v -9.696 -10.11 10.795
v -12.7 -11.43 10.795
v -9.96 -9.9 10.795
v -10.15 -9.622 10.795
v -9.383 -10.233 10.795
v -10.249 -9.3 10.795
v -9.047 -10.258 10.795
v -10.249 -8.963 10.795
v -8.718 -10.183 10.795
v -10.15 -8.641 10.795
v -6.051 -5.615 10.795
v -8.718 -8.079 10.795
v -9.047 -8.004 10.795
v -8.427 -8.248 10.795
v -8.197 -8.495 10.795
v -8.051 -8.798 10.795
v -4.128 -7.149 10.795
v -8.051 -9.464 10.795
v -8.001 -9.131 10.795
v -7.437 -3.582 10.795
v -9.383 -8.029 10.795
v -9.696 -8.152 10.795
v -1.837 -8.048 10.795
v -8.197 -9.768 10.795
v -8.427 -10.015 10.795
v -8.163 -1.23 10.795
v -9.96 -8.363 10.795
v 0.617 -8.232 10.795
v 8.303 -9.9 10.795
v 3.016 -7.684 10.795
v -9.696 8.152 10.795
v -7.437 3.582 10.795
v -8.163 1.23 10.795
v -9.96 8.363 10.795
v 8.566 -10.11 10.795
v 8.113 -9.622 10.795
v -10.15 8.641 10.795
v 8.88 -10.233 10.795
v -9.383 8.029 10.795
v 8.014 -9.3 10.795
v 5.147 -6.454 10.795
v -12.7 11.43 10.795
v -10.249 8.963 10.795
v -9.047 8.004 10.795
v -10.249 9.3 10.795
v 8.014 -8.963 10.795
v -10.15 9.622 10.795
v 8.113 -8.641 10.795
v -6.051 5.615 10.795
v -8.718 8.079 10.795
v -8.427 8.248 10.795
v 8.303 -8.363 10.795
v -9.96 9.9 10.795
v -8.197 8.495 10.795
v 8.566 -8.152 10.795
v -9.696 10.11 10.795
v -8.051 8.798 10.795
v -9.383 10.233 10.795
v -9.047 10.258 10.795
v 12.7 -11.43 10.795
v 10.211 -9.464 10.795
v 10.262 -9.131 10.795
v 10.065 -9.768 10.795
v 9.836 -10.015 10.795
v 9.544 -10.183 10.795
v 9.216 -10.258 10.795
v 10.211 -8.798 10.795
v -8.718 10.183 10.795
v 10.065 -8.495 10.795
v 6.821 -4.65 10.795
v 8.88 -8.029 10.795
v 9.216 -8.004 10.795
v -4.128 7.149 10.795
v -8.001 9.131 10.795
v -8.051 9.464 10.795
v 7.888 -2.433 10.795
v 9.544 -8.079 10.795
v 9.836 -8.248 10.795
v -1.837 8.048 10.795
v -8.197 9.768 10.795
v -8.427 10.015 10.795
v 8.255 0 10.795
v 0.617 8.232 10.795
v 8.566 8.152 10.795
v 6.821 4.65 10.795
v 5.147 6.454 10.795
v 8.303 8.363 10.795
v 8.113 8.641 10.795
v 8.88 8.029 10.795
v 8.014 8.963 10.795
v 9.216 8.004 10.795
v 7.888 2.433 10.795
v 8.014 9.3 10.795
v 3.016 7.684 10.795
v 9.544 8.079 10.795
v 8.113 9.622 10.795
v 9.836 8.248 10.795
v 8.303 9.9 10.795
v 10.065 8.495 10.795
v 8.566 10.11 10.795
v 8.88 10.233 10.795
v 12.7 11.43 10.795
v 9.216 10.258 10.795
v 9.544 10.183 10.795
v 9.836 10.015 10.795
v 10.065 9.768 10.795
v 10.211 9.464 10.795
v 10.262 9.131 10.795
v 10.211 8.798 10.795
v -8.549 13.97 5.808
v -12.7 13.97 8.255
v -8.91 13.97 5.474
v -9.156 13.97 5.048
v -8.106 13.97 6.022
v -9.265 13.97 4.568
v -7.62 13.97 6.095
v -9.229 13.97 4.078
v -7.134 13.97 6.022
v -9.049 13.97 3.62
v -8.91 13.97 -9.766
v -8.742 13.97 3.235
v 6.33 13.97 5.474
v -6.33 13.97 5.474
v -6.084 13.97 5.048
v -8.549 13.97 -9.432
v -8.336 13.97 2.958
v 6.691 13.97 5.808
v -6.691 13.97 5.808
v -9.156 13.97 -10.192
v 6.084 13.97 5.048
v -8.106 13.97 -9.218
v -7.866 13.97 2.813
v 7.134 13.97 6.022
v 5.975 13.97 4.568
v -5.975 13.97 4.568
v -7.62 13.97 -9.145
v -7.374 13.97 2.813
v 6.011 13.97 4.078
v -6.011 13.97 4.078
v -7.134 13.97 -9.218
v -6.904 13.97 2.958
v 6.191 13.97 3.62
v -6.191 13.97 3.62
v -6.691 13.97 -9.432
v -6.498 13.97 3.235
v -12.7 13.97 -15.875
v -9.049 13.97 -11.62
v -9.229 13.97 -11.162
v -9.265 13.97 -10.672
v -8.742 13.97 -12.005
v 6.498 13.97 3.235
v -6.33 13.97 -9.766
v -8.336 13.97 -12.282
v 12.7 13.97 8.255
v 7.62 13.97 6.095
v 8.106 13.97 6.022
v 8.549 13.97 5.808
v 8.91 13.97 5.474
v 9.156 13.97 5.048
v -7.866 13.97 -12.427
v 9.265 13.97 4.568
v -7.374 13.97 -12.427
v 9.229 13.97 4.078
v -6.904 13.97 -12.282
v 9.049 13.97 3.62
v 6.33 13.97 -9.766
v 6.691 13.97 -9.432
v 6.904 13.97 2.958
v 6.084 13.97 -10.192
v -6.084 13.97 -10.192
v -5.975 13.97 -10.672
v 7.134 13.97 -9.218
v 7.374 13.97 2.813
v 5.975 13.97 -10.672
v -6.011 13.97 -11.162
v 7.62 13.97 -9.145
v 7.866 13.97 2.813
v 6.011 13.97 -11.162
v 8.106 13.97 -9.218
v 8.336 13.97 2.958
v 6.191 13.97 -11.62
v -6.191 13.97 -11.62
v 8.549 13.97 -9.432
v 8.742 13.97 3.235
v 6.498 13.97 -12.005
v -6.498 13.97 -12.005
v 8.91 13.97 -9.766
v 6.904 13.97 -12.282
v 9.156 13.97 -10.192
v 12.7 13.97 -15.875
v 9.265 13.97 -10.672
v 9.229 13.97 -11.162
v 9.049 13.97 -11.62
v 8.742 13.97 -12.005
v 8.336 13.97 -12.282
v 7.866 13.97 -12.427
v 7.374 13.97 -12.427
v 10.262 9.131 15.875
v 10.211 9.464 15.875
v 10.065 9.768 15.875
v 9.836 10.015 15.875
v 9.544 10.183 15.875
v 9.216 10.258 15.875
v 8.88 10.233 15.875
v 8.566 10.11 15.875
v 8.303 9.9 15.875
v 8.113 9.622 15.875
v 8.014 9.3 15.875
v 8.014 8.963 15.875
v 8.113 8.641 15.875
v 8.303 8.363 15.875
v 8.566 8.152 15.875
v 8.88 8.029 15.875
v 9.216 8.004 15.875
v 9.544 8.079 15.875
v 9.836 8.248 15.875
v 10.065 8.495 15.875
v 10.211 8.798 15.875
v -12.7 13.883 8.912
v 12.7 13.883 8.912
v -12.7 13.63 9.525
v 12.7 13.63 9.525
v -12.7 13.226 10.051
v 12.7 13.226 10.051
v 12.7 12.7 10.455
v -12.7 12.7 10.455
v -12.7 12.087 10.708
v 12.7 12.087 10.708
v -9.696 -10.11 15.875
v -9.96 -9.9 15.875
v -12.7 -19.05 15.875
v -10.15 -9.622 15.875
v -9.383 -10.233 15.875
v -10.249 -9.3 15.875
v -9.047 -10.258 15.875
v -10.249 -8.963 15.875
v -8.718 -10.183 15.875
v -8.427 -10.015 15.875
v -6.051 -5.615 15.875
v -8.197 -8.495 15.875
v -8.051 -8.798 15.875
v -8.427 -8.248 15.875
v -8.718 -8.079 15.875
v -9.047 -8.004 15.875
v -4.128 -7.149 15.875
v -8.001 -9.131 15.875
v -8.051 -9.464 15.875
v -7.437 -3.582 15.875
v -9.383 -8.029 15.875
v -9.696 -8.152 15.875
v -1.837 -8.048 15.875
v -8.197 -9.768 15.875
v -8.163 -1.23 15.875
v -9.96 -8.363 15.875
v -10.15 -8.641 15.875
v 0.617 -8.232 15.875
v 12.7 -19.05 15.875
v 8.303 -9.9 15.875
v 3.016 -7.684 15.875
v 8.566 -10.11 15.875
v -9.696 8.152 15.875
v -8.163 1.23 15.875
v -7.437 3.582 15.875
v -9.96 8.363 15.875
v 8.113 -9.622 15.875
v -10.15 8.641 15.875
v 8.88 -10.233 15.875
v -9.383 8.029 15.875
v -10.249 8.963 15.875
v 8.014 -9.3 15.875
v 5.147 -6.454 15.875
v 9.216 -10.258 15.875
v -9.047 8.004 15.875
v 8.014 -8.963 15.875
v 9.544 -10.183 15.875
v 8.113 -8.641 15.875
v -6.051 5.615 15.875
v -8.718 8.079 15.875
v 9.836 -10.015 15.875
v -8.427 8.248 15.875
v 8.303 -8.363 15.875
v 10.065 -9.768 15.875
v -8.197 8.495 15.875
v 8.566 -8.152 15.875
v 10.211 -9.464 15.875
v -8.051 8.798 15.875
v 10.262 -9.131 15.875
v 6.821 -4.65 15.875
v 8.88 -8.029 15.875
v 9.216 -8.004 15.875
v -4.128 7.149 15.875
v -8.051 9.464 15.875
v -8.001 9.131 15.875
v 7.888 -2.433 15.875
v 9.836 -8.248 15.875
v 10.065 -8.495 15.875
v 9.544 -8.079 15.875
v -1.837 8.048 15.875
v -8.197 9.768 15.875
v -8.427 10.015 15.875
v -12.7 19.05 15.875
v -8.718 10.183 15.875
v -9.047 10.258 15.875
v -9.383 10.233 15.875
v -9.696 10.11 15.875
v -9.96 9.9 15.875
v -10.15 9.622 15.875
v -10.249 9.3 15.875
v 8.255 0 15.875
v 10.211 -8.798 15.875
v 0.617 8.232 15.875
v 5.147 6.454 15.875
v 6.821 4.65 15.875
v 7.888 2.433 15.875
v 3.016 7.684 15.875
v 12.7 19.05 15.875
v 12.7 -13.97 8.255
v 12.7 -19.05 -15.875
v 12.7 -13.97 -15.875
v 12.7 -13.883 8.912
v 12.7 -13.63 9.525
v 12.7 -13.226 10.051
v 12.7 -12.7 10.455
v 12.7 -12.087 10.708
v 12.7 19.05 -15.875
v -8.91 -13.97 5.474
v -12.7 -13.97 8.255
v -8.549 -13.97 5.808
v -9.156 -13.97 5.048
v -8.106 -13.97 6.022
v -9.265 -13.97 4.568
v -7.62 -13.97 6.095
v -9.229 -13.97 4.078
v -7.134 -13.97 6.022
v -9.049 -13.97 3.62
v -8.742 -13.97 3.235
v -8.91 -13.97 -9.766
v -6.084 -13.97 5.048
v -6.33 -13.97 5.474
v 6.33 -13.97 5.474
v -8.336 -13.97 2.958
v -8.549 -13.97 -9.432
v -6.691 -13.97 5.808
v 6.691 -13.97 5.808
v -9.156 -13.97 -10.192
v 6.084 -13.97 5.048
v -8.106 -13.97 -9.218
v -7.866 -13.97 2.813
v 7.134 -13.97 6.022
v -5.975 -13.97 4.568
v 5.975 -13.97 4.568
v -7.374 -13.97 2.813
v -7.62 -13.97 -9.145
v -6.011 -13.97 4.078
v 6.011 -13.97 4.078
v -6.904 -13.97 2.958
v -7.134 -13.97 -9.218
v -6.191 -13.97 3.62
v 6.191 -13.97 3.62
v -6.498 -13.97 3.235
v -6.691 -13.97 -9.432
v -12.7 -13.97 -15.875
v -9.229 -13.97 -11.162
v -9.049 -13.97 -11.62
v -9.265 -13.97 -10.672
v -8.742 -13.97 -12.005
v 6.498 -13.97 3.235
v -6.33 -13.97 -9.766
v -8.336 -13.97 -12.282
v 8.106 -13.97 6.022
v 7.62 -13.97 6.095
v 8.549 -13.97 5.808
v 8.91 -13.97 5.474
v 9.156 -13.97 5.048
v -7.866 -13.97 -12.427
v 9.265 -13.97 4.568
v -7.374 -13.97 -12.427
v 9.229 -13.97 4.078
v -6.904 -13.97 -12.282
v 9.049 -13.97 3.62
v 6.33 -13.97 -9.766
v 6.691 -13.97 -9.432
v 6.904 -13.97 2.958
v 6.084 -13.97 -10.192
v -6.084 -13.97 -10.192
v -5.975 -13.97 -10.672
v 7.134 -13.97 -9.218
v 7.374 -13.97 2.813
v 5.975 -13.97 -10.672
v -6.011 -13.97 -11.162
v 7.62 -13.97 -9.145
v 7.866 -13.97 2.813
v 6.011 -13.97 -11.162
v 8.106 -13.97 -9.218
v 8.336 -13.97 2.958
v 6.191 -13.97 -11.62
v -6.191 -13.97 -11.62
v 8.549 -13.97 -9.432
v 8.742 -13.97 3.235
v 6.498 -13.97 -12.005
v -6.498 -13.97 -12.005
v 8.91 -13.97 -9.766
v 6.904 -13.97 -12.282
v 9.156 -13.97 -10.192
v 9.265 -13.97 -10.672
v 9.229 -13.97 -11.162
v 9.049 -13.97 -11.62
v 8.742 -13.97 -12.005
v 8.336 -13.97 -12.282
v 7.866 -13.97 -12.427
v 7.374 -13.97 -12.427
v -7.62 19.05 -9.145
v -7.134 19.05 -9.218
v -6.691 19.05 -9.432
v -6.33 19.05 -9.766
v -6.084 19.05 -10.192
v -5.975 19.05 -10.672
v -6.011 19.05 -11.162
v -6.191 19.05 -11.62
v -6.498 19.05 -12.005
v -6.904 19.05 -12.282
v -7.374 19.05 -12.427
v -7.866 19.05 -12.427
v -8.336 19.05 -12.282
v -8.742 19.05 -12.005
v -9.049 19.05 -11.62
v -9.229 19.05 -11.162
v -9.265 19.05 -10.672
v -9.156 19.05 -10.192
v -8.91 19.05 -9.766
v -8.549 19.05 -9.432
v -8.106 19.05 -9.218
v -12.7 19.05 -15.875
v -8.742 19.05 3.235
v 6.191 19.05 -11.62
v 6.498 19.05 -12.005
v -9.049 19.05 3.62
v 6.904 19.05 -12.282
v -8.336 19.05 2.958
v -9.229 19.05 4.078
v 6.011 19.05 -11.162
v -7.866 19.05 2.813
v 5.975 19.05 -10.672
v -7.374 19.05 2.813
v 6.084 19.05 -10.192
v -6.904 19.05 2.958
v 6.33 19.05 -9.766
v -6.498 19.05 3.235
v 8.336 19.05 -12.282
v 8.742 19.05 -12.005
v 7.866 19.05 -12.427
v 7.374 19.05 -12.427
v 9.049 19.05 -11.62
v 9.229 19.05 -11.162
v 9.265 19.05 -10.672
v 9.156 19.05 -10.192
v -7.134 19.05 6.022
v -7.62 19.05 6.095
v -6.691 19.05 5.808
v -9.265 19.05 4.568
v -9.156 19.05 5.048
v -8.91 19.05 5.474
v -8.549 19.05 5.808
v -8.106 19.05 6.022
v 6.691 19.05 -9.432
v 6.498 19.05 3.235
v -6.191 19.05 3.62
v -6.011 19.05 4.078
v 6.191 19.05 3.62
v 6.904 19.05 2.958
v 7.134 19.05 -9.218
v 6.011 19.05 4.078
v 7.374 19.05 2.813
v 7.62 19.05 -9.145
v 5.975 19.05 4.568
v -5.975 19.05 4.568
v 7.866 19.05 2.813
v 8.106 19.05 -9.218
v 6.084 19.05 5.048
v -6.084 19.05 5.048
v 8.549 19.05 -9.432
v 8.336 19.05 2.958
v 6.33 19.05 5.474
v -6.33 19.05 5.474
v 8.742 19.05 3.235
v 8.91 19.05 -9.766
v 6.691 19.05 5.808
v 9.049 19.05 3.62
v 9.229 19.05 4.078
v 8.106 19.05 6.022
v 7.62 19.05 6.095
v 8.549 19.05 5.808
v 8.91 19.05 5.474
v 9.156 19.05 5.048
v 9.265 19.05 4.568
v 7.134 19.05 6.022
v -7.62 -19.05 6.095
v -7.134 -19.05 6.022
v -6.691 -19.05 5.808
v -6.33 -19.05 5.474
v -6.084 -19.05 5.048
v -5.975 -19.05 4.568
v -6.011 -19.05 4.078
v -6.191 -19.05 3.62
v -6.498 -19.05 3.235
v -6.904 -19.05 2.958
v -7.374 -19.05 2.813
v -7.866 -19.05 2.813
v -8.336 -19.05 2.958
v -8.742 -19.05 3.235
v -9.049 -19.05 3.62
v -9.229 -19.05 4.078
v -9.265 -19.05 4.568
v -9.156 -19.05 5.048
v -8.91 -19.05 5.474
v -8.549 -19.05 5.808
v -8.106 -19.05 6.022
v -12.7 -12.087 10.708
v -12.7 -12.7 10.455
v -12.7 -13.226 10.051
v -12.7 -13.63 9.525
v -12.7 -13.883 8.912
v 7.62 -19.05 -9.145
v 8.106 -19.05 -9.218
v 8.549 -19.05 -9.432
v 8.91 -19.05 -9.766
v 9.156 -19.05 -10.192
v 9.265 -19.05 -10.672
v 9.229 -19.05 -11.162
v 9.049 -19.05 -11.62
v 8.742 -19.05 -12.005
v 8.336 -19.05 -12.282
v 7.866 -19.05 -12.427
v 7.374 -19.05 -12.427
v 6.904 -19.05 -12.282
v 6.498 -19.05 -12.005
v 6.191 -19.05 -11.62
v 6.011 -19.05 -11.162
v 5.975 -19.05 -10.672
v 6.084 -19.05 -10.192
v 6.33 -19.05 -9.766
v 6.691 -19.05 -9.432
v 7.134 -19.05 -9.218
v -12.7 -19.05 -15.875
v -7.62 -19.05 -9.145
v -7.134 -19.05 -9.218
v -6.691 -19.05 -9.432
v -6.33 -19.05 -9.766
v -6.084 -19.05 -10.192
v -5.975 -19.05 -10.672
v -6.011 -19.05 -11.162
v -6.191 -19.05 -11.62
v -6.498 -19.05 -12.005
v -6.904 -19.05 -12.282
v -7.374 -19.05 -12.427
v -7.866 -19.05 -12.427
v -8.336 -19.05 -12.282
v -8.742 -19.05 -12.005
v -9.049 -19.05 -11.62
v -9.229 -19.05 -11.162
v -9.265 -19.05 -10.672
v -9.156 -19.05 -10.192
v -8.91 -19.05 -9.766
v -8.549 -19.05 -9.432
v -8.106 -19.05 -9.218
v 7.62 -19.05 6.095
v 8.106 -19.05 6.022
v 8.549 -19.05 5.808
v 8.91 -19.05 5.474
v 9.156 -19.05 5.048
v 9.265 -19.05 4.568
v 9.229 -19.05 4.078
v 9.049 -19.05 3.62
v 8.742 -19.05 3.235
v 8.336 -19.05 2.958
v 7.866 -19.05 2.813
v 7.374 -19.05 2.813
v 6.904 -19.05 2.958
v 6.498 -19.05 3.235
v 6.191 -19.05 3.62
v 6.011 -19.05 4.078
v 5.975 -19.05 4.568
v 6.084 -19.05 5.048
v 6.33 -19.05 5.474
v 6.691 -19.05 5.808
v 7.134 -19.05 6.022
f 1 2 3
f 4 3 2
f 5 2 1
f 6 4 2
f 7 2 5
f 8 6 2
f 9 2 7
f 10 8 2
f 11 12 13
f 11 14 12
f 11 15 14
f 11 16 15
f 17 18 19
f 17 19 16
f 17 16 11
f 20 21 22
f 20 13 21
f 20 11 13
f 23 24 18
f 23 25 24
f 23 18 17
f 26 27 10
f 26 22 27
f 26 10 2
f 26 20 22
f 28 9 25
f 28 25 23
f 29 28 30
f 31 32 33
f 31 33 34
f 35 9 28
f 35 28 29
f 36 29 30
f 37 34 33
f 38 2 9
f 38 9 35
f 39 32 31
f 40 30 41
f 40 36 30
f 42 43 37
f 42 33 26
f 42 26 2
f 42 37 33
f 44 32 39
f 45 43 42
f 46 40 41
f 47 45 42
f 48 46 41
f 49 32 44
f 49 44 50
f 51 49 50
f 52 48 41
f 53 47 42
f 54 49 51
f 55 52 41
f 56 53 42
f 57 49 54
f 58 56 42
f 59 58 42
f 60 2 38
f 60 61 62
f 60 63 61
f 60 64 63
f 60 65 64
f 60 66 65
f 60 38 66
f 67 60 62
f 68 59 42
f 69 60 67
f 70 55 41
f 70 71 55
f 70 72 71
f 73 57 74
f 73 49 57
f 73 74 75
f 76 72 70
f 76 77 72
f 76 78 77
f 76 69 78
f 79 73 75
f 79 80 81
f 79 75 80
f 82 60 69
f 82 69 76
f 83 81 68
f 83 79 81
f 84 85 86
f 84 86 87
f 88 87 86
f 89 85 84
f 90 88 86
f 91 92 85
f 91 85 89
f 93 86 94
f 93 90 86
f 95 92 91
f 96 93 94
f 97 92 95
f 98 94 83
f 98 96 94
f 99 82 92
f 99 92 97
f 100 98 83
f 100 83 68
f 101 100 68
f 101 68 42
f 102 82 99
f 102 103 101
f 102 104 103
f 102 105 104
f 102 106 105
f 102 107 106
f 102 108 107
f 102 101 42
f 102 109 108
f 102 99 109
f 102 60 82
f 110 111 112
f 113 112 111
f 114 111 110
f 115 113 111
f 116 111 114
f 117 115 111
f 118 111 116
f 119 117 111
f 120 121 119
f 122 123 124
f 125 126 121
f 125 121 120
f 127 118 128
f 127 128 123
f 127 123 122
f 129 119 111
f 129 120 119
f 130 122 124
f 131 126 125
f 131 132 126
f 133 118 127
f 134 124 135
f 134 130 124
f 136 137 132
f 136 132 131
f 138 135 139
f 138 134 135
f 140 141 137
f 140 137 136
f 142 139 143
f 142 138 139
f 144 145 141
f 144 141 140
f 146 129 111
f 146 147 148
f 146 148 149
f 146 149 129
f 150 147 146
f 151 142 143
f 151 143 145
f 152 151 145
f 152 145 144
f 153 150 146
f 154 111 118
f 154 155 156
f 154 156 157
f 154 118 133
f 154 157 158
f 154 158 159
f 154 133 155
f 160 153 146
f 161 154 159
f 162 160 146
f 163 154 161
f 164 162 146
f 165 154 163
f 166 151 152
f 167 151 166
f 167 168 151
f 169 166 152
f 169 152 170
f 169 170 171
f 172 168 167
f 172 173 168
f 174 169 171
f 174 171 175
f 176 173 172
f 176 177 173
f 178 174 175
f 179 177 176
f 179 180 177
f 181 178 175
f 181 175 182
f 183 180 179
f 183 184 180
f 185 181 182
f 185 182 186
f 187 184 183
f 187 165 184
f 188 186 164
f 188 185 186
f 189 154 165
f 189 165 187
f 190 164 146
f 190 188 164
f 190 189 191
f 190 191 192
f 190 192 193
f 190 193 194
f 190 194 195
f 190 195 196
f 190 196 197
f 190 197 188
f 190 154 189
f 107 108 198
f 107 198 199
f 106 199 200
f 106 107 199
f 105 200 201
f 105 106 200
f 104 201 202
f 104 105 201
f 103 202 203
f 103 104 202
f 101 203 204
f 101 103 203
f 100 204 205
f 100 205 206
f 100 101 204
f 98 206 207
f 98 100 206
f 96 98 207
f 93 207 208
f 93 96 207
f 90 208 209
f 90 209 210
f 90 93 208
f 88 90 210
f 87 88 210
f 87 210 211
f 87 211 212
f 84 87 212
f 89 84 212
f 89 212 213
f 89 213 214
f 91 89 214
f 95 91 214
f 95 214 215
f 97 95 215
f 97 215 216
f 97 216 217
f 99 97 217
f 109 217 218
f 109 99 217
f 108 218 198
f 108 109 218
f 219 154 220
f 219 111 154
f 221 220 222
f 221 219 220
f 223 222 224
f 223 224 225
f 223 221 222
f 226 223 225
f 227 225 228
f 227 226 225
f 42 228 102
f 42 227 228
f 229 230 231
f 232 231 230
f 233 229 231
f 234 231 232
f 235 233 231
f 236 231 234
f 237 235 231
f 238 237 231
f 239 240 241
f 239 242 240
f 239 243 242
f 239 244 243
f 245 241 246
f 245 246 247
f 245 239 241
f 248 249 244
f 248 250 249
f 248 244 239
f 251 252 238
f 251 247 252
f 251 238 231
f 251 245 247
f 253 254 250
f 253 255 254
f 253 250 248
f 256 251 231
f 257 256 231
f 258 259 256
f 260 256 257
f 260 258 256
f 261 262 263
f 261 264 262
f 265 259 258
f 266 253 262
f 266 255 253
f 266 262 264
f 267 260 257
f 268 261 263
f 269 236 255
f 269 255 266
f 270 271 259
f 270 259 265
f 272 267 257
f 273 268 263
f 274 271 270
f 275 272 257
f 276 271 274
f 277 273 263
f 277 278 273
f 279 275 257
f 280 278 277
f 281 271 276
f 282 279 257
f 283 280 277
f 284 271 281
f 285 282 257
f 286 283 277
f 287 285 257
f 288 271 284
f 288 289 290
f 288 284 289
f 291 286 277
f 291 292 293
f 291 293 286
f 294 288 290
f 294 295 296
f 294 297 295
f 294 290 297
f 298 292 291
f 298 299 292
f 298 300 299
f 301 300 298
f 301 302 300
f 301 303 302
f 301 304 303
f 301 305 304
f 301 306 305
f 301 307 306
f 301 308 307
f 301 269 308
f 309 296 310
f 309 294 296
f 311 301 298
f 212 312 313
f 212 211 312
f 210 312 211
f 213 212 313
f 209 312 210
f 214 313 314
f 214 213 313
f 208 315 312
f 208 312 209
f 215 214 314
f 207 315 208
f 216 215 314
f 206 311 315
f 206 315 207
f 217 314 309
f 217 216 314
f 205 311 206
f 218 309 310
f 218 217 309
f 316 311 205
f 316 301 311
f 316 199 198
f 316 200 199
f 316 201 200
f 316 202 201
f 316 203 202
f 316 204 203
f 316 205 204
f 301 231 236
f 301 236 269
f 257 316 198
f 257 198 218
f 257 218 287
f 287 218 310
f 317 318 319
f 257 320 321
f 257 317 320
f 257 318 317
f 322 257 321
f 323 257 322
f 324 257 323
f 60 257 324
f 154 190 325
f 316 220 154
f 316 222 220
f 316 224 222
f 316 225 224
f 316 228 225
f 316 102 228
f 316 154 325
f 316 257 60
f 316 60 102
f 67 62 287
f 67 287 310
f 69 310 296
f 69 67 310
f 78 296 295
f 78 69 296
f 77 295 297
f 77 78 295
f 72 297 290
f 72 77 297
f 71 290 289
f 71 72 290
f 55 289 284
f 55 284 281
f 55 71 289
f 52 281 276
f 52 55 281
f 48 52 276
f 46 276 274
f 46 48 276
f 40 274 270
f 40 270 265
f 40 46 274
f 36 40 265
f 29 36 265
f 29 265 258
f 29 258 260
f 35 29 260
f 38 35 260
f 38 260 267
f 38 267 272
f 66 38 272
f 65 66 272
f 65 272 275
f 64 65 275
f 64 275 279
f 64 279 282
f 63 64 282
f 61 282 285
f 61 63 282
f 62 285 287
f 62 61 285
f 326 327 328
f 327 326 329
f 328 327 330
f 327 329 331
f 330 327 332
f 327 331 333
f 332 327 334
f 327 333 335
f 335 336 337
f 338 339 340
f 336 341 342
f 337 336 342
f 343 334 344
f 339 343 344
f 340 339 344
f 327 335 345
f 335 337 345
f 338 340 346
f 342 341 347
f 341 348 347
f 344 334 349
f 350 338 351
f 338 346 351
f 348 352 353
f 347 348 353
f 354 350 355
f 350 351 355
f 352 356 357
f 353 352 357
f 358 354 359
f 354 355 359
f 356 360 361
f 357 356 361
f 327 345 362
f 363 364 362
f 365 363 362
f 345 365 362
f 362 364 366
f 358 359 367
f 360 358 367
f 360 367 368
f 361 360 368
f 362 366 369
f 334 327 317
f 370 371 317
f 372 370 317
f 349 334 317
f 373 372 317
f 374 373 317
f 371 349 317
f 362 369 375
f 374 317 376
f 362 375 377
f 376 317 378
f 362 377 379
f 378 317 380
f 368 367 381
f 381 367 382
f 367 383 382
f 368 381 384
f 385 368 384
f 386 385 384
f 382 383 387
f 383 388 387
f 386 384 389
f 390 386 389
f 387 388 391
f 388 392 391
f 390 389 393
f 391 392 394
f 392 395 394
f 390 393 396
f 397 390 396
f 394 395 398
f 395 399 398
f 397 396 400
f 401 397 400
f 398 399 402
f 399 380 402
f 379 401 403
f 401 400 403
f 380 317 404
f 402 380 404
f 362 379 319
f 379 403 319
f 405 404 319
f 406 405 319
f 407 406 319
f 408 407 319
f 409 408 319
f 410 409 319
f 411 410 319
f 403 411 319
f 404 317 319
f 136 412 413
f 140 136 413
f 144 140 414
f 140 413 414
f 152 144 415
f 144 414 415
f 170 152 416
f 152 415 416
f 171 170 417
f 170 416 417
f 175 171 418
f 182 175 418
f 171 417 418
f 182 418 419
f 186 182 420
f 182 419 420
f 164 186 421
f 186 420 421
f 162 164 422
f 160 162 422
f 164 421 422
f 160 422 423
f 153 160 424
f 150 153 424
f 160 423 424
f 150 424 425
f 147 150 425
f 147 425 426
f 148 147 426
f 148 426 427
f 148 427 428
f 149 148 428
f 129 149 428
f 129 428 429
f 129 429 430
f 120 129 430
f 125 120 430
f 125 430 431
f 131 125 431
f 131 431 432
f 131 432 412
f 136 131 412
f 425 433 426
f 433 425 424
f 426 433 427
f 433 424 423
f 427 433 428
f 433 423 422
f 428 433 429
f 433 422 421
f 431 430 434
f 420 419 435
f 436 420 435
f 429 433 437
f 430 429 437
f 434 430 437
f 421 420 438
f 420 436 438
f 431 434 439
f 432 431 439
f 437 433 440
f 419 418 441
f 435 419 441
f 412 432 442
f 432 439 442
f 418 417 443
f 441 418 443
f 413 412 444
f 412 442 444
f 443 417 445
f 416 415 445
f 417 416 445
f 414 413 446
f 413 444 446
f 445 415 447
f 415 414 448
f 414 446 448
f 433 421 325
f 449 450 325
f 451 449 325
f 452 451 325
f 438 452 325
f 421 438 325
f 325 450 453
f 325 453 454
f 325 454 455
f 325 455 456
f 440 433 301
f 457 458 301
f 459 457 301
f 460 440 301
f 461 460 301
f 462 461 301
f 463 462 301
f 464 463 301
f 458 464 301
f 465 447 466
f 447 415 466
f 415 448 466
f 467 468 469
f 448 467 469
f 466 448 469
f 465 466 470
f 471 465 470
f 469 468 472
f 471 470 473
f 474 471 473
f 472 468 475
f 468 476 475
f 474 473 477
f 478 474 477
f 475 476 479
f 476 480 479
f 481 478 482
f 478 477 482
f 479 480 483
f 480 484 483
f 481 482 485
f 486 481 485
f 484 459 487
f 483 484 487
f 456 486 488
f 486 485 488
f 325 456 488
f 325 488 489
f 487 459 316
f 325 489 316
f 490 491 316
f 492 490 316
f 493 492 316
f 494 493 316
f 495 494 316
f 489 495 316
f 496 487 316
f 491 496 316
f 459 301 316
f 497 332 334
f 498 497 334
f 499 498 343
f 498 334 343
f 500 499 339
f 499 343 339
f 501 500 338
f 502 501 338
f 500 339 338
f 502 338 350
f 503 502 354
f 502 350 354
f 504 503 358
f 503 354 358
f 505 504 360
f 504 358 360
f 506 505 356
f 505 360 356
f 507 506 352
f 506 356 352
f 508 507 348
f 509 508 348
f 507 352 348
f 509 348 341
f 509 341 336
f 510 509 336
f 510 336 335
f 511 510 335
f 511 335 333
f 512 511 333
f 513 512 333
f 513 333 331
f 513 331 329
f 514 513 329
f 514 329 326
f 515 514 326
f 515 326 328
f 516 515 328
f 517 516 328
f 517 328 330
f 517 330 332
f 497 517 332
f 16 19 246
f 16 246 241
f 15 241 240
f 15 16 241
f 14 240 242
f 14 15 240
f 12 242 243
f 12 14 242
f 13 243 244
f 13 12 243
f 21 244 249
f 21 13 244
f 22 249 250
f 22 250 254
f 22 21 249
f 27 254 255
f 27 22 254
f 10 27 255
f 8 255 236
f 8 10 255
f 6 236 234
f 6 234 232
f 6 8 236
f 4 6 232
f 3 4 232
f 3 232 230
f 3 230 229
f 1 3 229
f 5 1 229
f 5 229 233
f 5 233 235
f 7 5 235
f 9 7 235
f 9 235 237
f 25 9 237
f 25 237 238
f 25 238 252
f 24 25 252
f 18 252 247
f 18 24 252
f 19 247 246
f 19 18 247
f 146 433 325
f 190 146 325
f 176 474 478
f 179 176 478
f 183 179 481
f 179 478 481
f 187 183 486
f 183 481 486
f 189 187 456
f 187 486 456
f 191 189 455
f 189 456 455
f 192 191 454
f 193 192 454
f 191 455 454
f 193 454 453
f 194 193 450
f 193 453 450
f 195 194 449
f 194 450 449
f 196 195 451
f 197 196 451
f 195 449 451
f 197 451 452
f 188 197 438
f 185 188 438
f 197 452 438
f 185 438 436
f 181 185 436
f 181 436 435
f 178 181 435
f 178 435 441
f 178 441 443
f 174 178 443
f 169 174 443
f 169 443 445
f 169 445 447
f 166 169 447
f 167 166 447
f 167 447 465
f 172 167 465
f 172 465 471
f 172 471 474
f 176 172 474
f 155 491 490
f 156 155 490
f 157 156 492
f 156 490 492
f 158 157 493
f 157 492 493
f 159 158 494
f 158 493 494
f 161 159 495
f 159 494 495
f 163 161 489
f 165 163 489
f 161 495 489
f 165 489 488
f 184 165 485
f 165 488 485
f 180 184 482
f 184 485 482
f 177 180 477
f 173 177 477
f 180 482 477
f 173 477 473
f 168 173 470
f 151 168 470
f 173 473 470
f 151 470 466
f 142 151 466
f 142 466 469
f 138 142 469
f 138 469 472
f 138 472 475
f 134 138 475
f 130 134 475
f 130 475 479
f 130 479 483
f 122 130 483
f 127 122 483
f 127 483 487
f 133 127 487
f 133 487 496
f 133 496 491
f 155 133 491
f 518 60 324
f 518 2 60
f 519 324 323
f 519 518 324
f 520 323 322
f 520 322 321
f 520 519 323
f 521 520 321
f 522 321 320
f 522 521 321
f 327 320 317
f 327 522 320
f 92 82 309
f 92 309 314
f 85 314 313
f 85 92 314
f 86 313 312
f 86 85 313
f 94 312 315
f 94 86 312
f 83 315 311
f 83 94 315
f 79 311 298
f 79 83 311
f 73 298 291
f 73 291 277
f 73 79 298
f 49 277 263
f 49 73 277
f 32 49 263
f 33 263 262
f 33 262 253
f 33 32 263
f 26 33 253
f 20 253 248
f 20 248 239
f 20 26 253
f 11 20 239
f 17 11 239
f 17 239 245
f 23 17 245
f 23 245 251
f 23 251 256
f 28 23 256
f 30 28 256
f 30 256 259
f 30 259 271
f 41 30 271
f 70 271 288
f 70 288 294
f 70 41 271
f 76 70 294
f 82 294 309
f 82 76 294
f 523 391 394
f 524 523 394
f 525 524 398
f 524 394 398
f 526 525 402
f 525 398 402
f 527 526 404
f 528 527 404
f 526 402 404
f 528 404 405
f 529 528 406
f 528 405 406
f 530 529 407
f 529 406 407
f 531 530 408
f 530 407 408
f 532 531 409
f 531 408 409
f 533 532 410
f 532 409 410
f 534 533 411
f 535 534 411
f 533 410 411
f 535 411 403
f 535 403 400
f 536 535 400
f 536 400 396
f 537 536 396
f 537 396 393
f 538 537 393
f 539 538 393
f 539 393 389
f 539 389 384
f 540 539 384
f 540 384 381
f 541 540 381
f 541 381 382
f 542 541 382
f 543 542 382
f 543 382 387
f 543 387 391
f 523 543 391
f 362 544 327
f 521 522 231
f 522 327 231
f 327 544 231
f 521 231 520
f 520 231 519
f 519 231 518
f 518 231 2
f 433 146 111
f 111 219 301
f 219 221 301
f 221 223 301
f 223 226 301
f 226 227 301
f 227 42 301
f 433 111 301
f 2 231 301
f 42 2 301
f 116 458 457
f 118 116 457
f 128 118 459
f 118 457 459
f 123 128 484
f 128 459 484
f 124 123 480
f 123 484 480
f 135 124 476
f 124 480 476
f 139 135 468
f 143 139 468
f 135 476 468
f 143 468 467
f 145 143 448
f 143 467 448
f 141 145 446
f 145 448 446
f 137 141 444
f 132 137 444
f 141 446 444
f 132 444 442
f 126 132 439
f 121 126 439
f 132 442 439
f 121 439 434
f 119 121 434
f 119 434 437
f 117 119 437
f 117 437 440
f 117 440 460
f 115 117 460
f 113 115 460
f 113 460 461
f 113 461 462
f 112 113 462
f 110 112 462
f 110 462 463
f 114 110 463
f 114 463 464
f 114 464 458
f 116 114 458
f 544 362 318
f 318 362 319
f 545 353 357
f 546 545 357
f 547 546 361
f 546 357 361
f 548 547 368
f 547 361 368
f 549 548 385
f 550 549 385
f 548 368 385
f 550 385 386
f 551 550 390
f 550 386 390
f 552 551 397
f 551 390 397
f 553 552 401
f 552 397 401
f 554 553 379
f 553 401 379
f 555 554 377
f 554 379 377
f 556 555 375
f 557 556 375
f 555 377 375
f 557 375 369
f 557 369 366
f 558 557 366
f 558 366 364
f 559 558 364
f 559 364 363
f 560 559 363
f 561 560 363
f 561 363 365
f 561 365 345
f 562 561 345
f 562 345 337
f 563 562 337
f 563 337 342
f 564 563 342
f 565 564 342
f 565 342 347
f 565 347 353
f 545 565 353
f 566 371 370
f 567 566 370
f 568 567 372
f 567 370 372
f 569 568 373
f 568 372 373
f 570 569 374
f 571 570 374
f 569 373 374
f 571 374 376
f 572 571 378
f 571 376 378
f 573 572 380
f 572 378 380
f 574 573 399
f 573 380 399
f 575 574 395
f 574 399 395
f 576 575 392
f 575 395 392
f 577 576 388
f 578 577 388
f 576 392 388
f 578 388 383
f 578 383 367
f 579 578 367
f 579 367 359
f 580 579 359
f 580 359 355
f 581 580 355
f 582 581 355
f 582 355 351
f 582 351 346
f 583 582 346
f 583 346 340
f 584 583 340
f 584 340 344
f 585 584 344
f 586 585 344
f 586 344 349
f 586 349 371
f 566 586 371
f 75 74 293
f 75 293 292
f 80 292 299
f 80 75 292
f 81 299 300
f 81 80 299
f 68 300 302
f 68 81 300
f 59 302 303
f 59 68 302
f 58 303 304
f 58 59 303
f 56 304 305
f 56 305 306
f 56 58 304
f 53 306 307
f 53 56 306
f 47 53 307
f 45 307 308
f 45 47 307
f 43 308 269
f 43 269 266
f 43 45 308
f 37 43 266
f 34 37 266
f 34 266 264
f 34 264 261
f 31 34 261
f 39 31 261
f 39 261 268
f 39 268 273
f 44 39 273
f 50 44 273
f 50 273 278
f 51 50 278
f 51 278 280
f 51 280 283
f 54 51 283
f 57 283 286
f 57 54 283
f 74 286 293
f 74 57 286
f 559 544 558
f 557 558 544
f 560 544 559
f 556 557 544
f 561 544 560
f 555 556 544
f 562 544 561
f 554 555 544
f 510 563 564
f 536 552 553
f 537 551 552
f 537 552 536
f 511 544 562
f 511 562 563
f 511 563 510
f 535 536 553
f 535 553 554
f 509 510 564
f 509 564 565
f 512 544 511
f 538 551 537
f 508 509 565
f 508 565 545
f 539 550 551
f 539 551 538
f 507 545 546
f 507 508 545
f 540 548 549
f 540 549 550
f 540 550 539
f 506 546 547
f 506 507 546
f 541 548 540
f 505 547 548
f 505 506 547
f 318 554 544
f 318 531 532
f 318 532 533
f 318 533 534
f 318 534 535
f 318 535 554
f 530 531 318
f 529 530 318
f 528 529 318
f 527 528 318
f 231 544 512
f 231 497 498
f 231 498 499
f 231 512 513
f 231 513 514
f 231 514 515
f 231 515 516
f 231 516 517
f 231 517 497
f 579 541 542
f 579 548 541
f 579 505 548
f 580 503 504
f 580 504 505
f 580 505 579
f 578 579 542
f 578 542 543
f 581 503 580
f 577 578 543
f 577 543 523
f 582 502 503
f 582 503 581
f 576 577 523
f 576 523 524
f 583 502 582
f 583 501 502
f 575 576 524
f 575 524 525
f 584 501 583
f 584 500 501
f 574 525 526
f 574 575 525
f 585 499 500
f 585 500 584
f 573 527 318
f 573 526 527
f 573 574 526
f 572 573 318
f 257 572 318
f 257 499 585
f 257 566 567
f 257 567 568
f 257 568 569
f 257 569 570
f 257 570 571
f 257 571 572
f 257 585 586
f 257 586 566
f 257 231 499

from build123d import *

# Parameters (mm, degrees)
SKETCH1_W                                    = 25.4
SKETCH1_H                                    = 38.1
SKETCH1_R                                    = 8.255
SKETCH1_R_2                                  = 1.1303
BOSS_EXTRUDE_WITH_4_40_TAP_DRILL_HOLES_DEPTH = 15.875
CUT_EXTRUDE1_REACH                           = 37.498
SKETCH3_W                                    = 26.67
SKETCH3_H                                    = 27.94
FILLET1_R                                    = 2.54
SKETCH5_R                                    = 1.65
CLEARANCE_HOLES_FOR_M3_SCREW_DEPTH           = 44.184668865


with BuildPart() as part:
    # Sketch1 → Boss-Extrude with 4-40 Tap Drill Holes (new, symmetric)
    with BuildSketch(Plane.XY):
        Rectangle(SKETCH1_W, SKETCH1_H)
        Circle(SKETCH1_R, mode=Mode.SUBTRACT)
        with Locations((-9.1313, 9.1313)):
            Circle(SKETCH1_R_2, mode=Mode.SUBTRACT)
        with Locations((9.1313, 9.1313)):
            Circle(SKETCH1_R_2, mode=Mode.SUBTRACT)
        with Locations((-9.1313, -9.1313)):
            Circle(SKETCH1_R_2, mode=Mode.SUBTRACT)
        with Locations((9.1313, -9.1313)):
            Circle(SKETCH1_R_2, mode=Mode.SUBTRACT)
    extrude(amount=BOSS_EXTRUDE_WITH_4_40_TAP_DRILL_HOLES_DEPTH, both=True)

    # Sketch3 → Cut-Extrude1 (cut, up to next)
    with BuildSketch(Plane(origin=(12.7, 0, 0), x_dir=(0, 0, -1), z_dir=(1, 0, 0)), mode=Mode.PRIVATE) as cut_extrude1_sk1:
        with Locations((2.54, 0)):
            Rectangle(SKETCH3_W, SKETCH3_H)
    cut_extrude1_tool1 = extrude(cut_extrude1_sk1.sketch, amount=-CUT_EXTRUDE1_REACH, mode=Mode.PRIVATE) & part.part
    add(cut_extrude1_tool1.solids().sort_by_distance((12.7, 0, -2.54))[0], mode=Mode.SUBTRACT)

    # Fillet1
    fillet1_edges = [part.edges().sort_by_distance(p)[0] for p in [
        (0, -13.97, 10.795),
        (0, 13.97, 10.795),
    ]]
    fillet(fillet1_edges, radius=FILLET1_R)

    # Sketch5 → Clearance Holes for M3 Screw (cut, through all)
    with BuildSketch(Plane(origin=(0, 19.05, 0), x_dir=(1, 0, 0), z_dir=(0, 1, 0))):
        with Locations(Location((-7.62, 10.795, 0), (0, 0, 270))):
            Circle(SKETCH5_R)
        with Locations(Location((-7.62, -4.445, 0), (0, 0, 270))):
            Circle(SKETCH5_R)
        with Locations(Location((7.62, -4.445, 0), (0, 0, 270))):
            Circle(SKETCH5_R)
        with Locations(Location((7.62, 10.795, 0), (0, 0, 270))):
            Circle(SKETCH5_R)
    extrude(amount=-CLEARANCE_HOLES_FOR_M3_SCREW_DEPTH, mode=Mode.SUBTRACT)


solid = part.part
